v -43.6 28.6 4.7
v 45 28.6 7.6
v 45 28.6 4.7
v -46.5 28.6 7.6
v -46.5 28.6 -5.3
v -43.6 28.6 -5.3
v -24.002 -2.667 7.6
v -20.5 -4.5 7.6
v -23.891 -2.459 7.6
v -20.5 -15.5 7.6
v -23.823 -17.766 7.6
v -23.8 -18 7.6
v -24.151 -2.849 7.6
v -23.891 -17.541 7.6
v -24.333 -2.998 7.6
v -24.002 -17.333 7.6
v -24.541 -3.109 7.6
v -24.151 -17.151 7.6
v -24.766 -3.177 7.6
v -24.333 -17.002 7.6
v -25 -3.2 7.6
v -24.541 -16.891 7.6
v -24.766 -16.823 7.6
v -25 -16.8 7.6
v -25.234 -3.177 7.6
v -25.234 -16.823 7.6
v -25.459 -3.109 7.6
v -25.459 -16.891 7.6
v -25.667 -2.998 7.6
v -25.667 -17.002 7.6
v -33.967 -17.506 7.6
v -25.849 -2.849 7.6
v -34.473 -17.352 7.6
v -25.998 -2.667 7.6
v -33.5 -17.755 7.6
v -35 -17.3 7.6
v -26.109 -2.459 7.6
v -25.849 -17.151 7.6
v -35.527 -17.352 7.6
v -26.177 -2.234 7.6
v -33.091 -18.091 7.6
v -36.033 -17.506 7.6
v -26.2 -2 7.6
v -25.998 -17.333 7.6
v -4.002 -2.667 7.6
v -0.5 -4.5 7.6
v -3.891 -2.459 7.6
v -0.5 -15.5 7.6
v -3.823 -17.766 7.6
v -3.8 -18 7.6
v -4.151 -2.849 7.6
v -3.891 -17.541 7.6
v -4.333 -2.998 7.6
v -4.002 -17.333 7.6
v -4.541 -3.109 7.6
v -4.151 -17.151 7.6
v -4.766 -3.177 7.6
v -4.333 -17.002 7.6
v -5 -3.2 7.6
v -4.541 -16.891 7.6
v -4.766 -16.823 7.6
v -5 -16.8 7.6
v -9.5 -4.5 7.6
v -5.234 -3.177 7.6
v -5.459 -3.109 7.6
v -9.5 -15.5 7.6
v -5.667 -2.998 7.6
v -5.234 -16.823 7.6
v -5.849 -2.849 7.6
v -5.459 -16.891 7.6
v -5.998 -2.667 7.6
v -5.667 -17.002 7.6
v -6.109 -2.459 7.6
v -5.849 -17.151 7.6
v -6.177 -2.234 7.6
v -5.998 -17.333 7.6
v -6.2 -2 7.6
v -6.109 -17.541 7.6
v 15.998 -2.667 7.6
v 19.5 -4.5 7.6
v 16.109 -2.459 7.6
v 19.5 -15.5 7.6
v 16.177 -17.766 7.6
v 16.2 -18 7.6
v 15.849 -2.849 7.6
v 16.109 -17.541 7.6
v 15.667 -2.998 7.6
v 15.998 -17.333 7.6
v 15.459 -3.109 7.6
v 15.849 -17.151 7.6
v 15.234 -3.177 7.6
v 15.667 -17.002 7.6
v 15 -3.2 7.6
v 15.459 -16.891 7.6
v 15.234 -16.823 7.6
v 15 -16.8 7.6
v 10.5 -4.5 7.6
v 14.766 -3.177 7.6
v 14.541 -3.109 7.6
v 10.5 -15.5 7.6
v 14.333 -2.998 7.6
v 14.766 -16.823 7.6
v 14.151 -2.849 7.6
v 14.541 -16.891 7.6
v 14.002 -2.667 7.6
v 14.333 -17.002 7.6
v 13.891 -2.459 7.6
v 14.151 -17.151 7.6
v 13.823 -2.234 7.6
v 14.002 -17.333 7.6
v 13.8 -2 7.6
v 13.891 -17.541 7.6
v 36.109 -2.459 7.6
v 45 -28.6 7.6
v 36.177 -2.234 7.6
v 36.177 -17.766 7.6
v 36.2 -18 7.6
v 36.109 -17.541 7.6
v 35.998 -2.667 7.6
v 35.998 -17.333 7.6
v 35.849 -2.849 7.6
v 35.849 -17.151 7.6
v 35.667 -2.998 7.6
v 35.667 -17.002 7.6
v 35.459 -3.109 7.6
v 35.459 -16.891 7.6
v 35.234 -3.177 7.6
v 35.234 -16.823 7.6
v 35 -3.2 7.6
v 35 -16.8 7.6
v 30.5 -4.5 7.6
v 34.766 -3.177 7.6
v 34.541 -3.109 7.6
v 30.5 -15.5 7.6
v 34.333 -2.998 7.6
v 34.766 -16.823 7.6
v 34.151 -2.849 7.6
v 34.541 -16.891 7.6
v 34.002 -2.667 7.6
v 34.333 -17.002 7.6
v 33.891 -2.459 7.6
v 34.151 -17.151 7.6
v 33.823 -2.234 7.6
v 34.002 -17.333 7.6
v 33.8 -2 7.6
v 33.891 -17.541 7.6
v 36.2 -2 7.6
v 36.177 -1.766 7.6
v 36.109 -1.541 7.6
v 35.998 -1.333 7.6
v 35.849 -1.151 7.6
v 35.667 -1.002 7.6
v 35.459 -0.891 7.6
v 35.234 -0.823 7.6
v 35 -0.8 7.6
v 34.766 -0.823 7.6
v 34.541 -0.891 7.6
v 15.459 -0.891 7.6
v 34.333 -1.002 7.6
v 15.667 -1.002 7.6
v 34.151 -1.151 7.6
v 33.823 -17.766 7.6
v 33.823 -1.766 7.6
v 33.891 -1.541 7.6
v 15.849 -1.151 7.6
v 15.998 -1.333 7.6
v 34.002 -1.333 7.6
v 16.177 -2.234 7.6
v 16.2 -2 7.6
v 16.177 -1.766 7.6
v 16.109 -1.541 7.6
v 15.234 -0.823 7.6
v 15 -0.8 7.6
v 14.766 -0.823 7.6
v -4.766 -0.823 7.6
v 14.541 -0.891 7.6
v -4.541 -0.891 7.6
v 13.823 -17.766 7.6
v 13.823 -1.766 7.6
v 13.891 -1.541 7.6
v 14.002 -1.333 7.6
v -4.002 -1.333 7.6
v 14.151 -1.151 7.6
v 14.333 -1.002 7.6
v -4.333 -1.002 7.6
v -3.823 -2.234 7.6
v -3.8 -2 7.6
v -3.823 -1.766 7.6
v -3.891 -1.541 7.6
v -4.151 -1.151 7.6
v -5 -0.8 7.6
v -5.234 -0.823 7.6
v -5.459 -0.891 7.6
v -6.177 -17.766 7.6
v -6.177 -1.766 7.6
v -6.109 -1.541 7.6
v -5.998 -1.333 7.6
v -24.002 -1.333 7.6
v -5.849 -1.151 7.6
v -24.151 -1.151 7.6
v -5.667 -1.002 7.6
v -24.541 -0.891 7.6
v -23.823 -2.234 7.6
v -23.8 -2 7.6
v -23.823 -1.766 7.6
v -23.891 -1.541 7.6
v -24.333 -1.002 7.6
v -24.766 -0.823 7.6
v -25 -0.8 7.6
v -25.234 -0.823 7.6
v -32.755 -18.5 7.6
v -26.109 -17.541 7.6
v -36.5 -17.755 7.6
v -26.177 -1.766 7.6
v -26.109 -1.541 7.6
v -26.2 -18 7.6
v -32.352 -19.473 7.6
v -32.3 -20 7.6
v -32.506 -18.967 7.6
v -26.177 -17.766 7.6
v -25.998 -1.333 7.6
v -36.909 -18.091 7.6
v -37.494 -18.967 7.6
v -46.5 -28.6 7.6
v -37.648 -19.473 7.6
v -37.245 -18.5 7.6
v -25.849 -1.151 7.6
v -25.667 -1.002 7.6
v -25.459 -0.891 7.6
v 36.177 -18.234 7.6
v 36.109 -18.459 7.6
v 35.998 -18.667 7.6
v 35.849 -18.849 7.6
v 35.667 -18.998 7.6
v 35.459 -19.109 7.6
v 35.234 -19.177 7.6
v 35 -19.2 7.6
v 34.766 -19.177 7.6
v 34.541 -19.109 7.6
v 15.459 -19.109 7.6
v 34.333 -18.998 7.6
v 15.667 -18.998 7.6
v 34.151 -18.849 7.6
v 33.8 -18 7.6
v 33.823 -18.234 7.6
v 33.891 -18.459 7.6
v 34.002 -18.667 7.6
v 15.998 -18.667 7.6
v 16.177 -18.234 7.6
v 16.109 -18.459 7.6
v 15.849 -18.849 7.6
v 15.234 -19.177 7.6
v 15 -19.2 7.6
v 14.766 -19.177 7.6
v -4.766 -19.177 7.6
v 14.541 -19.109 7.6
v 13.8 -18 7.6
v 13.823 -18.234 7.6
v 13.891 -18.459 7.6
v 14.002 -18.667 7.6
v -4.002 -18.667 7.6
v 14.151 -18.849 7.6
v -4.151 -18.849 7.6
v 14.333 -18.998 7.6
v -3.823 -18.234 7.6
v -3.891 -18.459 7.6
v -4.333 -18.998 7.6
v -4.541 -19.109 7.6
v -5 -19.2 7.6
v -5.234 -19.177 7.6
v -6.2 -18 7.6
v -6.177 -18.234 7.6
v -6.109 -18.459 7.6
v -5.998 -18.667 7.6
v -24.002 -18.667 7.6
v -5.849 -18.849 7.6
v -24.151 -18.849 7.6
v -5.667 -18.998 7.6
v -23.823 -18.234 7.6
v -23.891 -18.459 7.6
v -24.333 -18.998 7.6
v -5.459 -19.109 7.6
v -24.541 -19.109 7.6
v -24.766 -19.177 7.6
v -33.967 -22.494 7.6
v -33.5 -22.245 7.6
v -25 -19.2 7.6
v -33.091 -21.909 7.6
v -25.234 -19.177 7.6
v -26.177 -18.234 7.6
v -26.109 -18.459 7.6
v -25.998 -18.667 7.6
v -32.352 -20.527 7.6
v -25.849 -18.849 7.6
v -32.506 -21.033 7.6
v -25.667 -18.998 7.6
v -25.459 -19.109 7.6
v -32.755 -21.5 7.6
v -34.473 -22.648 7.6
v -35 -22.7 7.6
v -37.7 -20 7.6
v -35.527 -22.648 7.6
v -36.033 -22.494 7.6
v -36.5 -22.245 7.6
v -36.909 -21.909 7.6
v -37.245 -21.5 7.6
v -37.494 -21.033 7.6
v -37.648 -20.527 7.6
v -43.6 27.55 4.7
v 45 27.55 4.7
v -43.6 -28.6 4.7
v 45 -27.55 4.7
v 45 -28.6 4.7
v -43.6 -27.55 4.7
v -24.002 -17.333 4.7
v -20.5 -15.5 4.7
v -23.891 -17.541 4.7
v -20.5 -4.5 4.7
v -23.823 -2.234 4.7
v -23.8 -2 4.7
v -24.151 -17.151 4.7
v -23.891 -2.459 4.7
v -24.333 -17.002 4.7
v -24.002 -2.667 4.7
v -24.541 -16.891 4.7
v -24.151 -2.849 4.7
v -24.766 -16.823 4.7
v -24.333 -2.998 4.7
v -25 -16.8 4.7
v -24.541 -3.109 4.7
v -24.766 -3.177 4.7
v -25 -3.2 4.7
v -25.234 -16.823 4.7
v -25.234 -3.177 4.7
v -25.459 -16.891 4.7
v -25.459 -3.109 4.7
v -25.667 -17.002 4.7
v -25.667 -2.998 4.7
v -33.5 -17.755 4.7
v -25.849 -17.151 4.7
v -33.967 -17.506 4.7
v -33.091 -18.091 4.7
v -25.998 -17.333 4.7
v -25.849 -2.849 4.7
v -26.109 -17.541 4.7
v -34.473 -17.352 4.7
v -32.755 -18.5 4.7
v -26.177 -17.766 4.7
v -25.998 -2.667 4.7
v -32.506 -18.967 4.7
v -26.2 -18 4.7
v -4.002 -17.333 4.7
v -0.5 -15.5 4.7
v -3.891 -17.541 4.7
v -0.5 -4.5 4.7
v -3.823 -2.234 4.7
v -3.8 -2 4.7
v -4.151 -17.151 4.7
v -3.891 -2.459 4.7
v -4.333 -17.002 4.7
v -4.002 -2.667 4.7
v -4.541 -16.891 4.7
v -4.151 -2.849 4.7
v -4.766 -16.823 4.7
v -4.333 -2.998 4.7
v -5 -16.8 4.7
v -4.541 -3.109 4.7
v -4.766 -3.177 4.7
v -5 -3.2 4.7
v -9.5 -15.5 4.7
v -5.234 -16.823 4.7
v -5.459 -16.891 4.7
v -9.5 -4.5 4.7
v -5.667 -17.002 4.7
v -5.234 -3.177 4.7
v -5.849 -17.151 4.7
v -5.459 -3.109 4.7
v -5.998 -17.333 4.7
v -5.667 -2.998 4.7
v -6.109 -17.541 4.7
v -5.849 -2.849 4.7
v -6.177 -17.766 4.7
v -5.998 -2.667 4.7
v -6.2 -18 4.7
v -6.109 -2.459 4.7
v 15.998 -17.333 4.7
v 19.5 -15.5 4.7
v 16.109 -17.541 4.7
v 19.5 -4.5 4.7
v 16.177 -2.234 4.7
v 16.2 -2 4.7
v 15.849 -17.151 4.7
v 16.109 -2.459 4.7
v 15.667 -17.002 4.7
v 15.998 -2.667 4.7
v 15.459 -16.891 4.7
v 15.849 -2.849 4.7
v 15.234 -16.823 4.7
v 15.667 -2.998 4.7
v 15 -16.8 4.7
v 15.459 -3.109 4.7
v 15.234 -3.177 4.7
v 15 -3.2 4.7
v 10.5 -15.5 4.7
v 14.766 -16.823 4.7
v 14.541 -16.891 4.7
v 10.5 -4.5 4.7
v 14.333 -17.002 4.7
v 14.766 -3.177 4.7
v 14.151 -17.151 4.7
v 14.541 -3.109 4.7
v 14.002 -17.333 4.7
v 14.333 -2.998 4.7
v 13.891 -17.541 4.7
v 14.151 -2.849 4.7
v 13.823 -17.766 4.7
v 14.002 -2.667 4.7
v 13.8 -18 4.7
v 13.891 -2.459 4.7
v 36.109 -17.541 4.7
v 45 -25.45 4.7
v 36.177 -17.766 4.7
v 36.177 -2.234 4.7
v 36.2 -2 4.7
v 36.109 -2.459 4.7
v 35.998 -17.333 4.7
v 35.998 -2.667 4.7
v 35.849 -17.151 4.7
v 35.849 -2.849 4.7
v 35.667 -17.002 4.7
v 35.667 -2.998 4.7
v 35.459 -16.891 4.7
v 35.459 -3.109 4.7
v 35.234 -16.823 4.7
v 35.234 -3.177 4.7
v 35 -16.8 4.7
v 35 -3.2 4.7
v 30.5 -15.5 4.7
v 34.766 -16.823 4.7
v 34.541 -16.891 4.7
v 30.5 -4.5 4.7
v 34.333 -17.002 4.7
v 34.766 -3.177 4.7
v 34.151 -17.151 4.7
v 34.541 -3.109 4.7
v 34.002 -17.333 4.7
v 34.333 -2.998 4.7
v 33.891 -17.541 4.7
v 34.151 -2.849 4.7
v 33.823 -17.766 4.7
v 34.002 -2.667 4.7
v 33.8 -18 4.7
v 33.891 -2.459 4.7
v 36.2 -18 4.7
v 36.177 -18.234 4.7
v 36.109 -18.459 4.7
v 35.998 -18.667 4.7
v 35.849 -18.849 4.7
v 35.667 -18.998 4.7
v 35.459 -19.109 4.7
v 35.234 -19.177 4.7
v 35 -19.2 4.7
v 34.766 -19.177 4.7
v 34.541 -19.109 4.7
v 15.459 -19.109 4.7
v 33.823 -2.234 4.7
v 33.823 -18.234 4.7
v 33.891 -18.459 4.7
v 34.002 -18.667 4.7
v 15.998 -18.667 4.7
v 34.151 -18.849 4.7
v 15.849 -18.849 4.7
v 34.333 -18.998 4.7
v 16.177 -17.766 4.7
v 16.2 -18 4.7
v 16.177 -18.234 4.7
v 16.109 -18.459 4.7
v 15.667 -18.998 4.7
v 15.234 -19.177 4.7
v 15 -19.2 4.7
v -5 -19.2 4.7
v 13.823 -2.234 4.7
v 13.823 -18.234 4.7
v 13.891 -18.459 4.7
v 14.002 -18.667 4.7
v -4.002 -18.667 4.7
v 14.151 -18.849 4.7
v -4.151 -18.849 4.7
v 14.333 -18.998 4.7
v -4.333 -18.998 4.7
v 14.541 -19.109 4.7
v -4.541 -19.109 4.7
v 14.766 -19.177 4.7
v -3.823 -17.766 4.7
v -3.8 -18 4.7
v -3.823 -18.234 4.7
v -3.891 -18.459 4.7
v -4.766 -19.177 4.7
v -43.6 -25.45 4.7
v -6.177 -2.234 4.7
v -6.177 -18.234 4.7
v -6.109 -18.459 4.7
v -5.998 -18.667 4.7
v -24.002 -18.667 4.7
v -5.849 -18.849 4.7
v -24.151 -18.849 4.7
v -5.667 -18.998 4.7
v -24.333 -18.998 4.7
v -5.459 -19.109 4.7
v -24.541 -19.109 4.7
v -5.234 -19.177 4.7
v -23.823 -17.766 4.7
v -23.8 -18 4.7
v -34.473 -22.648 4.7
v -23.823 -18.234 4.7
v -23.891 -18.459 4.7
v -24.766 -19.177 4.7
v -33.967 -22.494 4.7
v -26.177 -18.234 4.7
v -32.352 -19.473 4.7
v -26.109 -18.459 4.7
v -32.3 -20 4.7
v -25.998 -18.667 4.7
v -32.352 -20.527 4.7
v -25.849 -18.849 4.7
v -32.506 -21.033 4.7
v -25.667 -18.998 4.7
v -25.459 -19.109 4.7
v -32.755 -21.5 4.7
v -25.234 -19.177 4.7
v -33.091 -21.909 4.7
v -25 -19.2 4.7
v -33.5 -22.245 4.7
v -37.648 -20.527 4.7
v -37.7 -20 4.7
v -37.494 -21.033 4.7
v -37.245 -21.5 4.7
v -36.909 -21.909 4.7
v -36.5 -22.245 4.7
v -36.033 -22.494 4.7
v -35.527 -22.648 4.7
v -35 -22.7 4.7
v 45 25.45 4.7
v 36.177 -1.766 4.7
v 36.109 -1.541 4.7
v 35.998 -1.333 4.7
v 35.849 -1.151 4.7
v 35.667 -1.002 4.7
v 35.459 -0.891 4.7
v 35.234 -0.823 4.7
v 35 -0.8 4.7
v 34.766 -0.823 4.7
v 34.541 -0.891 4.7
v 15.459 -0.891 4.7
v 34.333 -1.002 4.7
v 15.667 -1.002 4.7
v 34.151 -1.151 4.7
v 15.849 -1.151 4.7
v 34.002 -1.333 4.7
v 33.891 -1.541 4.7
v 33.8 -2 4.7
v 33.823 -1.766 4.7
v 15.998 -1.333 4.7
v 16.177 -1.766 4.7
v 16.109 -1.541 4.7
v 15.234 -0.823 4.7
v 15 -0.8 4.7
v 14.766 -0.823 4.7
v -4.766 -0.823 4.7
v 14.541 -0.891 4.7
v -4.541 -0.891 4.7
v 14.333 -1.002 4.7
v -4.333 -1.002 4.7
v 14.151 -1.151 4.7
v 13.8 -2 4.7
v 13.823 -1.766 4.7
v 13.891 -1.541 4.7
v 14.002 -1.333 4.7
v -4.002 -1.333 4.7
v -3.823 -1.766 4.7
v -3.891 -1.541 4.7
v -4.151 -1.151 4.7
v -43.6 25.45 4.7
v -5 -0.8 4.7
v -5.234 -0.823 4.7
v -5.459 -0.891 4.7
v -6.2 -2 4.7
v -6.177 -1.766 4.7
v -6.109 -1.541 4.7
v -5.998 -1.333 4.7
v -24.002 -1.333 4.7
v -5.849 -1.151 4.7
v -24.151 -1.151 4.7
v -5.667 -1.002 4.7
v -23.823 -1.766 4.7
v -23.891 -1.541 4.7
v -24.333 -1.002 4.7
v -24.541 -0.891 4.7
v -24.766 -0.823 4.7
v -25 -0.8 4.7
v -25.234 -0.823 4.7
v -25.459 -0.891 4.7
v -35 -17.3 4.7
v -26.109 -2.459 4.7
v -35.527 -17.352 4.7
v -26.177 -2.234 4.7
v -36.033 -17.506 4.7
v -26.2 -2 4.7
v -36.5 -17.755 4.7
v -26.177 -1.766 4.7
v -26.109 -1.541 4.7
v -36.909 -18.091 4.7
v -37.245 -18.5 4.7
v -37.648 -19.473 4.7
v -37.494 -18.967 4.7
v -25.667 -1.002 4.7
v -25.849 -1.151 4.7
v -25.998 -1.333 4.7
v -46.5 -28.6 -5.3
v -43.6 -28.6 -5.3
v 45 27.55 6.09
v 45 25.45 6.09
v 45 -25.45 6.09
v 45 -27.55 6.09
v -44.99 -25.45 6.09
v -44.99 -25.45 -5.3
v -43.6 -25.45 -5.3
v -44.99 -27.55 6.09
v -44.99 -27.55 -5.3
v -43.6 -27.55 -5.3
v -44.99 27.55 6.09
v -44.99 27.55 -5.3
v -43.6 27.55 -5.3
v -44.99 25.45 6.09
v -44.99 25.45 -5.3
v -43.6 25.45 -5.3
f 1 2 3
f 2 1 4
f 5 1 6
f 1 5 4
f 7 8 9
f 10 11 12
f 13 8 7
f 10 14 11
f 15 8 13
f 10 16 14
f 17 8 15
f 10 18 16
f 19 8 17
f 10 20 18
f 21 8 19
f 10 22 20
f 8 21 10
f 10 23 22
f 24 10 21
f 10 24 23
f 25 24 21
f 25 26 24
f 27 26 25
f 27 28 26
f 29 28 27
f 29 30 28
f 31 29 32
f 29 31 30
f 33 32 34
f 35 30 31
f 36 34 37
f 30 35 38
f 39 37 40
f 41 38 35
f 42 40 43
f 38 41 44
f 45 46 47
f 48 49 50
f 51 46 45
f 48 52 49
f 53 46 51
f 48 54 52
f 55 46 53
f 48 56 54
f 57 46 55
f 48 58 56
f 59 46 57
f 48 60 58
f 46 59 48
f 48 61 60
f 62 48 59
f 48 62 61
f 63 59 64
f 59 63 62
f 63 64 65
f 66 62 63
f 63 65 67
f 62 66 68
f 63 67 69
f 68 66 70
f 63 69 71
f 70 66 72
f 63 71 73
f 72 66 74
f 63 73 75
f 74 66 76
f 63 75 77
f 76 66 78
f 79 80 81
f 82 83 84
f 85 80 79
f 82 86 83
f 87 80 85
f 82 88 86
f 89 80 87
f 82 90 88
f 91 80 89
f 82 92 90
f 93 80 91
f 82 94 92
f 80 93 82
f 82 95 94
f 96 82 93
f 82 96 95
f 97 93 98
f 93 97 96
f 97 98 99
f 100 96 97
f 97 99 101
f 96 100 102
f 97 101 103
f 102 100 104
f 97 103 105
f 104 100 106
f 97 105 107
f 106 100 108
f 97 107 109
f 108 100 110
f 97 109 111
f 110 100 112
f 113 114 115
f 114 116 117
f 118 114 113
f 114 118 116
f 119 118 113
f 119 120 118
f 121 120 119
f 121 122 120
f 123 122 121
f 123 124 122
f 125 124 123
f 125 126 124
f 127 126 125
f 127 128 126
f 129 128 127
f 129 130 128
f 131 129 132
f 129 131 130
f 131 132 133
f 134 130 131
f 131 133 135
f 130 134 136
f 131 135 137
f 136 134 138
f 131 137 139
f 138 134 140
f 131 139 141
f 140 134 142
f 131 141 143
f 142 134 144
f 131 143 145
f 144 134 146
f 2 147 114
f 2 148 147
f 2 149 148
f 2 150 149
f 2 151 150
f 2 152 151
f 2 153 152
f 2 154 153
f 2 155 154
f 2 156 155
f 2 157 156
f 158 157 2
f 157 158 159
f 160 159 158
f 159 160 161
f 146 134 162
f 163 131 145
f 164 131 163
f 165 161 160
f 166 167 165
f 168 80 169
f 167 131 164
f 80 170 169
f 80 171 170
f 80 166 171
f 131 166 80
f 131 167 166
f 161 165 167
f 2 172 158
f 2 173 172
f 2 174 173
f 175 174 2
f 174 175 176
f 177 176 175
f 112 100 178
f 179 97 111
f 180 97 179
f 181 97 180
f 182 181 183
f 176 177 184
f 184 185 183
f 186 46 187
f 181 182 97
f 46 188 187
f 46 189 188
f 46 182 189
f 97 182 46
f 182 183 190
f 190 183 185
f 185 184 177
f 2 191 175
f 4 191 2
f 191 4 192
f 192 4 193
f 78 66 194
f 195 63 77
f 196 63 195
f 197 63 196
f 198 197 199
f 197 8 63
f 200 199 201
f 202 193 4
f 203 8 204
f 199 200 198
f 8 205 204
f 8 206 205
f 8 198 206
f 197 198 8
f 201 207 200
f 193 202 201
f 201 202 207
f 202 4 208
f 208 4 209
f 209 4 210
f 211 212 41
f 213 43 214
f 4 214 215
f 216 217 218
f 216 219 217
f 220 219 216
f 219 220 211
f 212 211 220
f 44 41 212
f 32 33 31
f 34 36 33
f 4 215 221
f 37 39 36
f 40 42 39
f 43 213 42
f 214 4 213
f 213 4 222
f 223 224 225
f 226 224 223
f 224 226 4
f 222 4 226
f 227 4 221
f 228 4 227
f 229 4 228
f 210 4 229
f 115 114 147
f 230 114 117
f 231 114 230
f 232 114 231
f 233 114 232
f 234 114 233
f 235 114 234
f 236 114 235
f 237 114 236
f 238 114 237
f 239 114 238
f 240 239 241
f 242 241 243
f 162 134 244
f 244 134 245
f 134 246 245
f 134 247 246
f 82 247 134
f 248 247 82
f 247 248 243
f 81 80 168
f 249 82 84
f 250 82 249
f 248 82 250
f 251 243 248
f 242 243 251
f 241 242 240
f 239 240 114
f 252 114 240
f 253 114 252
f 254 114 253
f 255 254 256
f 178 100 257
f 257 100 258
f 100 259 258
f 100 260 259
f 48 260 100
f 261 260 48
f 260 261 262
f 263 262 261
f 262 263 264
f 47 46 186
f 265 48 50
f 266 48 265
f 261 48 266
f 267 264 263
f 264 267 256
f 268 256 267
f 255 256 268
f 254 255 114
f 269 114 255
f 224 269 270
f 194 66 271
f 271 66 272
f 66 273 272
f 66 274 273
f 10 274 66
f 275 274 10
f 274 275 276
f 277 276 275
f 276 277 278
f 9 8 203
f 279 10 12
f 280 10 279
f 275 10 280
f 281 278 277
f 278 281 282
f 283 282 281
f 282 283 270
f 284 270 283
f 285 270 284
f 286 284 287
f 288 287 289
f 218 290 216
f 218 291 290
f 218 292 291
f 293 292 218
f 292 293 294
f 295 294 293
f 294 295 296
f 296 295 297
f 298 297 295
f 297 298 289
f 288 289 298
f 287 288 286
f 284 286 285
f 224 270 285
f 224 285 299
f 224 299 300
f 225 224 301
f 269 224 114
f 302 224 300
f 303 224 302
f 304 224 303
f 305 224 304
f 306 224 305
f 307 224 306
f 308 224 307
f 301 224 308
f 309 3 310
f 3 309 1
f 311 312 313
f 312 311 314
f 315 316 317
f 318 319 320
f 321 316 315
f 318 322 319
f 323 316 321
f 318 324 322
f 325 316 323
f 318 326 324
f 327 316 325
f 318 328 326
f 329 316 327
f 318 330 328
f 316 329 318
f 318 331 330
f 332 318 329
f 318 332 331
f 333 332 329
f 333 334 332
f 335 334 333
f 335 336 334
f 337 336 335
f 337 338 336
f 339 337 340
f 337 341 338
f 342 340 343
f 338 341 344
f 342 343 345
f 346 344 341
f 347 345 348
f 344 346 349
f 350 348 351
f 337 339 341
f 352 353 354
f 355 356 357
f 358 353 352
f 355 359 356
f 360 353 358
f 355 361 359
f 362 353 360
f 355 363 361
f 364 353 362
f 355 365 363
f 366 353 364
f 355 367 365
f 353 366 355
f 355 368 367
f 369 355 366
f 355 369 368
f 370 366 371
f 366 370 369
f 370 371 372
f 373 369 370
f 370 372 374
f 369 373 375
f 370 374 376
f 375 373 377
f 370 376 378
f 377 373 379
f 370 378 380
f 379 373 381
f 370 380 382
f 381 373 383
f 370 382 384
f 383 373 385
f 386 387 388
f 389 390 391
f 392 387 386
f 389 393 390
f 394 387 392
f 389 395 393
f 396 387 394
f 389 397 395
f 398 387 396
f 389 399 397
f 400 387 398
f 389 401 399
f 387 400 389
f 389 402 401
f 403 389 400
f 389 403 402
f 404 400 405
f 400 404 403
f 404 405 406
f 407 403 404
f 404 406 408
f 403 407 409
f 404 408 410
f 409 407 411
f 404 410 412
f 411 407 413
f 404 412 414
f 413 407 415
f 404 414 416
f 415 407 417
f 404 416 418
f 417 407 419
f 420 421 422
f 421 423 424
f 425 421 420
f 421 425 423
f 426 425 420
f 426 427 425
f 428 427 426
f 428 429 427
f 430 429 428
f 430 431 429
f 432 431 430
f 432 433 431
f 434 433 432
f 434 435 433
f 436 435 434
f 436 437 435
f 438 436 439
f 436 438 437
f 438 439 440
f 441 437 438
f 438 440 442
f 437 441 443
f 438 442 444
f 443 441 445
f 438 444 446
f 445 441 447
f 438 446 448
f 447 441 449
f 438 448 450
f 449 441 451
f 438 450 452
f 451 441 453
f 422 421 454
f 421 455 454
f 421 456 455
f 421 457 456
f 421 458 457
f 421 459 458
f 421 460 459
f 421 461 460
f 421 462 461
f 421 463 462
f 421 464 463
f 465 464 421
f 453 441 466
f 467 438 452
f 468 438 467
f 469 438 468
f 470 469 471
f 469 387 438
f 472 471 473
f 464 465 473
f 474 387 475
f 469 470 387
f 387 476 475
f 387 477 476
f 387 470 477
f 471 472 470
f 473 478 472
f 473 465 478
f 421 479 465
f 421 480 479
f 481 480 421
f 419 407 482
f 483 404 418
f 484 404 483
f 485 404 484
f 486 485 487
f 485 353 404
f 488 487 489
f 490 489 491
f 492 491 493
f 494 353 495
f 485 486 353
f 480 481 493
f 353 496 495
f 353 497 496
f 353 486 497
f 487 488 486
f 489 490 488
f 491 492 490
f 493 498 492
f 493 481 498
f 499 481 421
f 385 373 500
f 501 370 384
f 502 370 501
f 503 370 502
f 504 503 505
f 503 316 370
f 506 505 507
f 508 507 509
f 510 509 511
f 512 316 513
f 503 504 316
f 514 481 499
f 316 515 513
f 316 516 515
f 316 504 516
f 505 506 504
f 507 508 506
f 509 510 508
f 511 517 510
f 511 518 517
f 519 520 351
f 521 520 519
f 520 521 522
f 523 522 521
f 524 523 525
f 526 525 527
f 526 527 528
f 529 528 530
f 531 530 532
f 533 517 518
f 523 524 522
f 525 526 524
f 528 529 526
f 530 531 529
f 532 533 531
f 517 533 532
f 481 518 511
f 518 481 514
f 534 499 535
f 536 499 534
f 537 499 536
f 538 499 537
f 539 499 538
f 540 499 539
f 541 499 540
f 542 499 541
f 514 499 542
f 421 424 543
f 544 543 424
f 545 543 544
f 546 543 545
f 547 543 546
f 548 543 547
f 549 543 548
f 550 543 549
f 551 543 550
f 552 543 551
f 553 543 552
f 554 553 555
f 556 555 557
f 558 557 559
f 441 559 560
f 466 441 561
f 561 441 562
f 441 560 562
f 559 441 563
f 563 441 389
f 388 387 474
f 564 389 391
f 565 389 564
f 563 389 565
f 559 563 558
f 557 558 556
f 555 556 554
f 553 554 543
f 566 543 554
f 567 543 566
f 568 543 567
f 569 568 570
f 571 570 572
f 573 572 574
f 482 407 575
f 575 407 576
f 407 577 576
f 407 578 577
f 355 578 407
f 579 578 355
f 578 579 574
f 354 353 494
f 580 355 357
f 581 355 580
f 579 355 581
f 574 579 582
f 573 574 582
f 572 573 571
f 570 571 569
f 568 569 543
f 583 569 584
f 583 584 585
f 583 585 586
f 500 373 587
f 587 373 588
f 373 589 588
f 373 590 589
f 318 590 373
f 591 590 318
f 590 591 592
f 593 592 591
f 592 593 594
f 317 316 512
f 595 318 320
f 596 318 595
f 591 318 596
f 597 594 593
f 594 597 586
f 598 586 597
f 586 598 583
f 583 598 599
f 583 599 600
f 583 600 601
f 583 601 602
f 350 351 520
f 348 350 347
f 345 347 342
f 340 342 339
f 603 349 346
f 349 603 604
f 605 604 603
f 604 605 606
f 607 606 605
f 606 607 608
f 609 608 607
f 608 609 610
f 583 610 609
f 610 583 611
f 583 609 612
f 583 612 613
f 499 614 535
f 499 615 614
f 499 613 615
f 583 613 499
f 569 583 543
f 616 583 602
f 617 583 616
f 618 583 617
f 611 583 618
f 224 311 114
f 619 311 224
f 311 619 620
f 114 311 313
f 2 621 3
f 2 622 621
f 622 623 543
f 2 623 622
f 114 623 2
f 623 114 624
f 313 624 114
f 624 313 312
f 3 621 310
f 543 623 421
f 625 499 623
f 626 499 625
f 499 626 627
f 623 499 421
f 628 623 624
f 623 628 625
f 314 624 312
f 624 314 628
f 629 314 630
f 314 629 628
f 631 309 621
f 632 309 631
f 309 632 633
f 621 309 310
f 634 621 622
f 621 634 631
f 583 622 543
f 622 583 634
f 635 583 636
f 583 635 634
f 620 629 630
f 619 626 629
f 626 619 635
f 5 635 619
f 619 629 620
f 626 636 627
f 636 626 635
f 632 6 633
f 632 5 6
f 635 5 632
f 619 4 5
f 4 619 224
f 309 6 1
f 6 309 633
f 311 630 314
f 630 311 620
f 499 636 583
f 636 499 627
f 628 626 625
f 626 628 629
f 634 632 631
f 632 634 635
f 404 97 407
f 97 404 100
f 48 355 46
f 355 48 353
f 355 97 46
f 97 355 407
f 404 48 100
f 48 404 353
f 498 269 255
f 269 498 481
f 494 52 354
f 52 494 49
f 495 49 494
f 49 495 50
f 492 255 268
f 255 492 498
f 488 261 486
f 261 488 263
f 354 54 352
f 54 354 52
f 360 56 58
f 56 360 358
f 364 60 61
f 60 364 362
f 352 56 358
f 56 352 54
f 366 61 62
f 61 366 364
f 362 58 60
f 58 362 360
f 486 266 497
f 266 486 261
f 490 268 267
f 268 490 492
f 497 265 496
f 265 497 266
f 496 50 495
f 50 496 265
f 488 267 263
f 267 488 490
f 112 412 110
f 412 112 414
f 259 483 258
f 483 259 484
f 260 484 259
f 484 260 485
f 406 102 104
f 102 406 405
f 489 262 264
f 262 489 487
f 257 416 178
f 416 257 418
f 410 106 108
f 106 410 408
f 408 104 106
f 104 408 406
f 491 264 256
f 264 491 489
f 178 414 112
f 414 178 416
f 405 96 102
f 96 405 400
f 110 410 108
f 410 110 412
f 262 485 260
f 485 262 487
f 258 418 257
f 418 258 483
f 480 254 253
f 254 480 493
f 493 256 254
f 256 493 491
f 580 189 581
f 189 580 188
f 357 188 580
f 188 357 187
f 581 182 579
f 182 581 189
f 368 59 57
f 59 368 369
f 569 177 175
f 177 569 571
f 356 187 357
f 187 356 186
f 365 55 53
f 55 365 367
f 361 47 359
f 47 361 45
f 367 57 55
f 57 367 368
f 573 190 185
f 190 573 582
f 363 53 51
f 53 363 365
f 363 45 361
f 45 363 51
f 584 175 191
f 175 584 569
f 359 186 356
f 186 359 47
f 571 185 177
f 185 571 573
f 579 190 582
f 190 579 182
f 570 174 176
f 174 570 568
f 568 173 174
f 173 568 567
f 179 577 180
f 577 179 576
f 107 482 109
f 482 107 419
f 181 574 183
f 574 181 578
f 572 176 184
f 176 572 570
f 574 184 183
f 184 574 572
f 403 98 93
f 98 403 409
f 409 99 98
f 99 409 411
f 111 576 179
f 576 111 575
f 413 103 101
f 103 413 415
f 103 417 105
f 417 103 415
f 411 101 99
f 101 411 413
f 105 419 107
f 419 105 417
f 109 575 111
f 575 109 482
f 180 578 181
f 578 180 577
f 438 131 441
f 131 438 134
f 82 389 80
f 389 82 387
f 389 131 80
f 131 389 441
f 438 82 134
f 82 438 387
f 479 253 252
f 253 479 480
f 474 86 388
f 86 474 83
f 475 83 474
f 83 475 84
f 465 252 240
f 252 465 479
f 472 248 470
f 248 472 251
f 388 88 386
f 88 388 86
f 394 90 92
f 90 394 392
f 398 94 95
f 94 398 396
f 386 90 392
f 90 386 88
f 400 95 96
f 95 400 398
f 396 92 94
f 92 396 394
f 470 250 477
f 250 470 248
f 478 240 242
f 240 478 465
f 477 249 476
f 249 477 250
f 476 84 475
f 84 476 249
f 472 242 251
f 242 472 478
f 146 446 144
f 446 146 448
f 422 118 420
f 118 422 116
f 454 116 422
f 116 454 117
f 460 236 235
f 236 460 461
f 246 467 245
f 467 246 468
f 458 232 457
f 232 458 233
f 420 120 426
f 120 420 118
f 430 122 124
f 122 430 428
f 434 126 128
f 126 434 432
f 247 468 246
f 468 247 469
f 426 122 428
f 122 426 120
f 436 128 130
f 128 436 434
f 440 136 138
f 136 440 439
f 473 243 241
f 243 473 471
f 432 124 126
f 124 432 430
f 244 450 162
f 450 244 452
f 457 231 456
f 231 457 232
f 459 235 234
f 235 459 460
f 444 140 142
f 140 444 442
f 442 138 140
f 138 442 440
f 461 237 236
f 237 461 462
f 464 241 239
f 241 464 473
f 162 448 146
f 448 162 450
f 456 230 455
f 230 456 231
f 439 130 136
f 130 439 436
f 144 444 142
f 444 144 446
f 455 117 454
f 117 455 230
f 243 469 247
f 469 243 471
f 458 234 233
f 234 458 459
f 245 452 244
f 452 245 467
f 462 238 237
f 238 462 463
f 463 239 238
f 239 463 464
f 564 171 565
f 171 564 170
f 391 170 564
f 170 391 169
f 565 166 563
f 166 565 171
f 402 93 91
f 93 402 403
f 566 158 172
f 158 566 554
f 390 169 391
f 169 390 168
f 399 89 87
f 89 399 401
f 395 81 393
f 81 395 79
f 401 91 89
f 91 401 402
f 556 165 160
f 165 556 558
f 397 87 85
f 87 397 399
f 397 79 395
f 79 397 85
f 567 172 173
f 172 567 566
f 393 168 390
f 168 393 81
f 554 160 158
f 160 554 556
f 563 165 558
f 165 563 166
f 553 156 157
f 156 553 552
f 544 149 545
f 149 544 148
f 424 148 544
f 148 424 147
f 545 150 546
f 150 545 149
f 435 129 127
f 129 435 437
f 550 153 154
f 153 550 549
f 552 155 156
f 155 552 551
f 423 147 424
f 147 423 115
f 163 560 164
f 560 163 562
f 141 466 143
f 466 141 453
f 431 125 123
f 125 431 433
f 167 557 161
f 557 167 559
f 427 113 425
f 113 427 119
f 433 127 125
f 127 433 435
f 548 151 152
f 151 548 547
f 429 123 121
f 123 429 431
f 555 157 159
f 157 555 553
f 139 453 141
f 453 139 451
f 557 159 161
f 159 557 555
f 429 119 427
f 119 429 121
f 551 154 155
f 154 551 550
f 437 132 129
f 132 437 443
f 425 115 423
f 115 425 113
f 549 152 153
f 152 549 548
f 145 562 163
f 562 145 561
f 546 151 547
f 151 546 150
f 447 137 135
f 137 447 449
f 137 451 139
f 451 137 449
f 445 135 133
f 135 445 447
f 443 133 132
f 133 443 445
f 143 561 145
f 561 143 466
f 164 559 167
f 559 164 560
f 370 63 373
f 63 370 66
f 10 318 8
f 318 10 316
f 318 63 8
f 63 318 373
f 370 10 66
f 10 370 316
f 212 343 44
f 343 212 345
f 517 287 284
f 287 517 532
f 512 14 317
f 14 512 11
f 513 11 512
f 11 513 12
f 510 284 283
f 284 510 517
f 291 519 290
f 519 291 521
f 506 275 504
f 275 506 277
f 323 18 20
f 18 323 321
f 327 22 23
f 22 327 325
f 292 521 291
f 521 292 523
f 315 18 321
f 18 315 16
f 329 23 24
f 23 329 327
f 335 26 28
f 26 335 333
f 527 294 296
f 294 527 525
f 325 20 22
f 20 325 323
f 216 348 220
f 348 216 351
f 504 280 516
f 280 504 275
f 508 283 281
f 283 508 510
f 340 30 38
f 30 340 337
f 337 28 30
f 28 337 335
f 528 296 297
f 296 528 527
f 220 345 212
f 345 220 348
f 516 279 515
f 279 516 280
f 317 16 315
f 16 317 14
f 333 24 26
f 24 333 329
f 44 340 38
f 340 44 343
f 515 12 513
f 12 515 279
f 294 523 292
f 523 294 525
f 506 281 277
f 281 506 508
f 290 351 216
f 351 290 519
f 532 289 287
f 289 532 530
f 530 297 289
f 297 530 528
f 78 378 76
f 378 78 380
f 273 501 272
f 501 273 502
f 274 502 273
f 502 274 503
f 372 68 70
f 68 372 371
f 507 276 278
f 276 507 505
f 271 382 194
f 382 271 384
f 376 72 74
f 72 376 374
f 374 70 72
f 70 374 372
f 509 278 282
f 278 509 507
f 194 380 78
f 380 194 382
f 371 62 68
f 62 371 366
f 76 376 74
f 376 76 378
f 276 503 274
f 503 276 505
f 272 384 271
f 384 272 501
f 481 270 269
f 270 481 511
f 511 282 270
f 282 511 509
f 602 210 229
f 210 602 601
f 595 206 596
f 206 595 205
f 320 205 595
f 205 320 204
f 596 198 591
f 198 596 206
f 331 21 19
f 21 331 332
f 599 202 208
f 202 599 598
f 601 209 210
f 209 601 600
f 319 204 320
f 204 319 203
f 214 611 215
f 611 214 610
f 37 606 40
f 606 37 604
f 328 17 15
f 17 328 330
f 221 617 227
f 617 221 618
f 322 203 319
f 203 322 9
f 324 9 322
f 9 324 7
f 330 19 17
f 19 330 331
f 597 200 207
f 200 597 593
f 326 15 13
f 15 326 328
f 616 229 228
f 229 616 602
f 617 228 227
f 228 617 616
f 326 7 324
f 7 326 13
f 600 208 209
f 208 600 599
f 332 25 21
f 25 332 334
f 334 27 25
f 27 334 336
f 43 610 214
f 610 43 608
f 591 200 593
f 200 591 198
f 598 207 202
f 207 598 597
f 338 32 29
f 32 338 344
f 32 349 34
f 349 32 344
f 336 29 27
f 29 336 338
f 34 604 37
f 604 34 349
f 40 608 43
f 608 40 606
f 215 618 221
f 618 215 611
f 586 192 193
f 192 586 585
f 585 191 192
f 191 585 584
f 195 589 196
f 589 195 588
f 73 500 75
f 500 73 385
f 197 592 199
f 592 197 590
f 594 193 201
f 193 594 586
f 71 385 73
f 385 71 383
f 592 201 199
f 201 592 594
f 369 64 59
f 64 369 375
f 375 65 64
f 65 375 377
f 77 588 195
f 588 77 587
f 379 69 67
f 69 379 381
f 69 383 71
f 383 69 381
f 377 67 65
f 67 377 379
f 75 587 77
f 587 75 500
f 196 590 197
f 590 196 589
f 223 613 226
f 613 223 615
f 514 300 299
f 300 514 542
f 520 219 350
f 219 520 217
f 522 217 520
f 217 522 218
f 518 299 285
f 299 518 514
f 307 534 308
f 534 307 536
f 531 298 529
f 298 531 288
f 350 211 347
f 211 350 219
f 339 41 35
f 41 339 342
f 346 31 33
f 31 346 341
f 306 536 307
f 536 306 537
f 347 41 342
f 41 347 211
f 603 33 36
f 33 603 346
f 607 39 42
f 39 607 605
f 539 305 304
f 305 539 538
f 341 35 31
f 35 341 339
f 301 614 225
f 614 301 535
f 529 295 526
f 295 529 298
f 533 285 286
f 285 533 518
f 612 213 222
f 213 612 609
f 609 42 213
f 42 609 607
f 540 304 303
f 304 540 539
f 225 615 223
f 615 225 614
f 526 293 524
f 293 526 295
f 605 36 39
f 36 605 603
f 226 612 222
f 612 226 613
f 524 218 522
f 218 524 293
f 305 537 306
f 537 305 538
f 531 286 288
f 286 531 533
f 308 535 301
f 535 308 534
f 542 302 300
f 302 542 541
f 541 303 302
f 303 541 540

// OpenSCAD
$fn=32;
dbu=7.8;
dpin=2;
dpindist=9.5;
dtoppin=2;
dep=11;
topdep=20;
baseth=2;
topth=0.8;
stth=1;
buth=3.4;
scrh=buth+1.1;
buw=12;
b1x=0;
b2x=20;
b3x=-20;
width=70;//70
  pd=5;
//lid 
 lidThick=2.9;
 
 doupper=true;
 dolower=false;

//makebutton(b1x);
//makebutton(b2x);
//makebutton(b3x);

//upper lane
if(doupper){

translate([0,0,1])
    difference(){
       // translate([0,0,buth+topth/2]) cube([width,topdep,topth],center=true);    
        makelid();
        translate([+5,-10,0]){
                makebuttontopout(b1x);
                makebuttontopout(b2x);       
                makebuttontopout(b3x);
                makeledcutout(b3x-20,-10);
        }
    }
}

if(dolower){
    //lower lane

    difference(){
        union(){        
             translate([0,0,-baseth/2]) cube([width,dep,baseth],center=true);    
             
        }
        makebuttoncutout(b1x);
        makebuttoncutout(b2x);
        makebuttoncutout(b3x);
    }
    translate([0,0,0]){
        makebuttonclip(b1x);
        makebuttonclip(b2x);
        makebuttonclip(b3x);
        makepole(b1x);
        makepole(b2x);
        makepole(b2x*2);
        makepole(b3x);
   }
}

   


module makebutton(tx){
    translate([45+tx,-85,0]) import ("pressed_adafruit_square_tactile_button_1010.stl",convexity=3);
}

module makebuttoncutout(tx){
    dxofs=dpindist/2-dpin/4;
    translate([tx,0,0]){
        translate([-dxofs,0,-baseth-0.1]) cylinder(r=dpin/2,h=baseth+0.2);
        translate([+dxofs,0,-baseth-0.1]) cylinder(r=dpin/2,h=baseth+0.2);
        
        //#translate([-5-2/2,0,-baseth-0.2]) cylinder(r=2/2,h=baseth+0.2);
    }
}


module makebuttonclip(tx){
    cld=1;
    clw=2;
    clh=buth+0.1;
    dxofs=buw/2+cld;
    translate([tx,0,0]){
        translate([-dxofs,0,clh/2]){
            cube([1,clw,clh],center=true);
            translate([0.4,0,clh/2+0.4]) cube([1.8,clw,0.8],center=true);
        }
        translate([+dxofs,0,clh/2]){
            cube([1,clw,clh],center=true);
            translate([-0.4,0,clh/2+0.4]) cube([1.8,clw,0.8],center=true);
        }
        //#translate([-5-2/2,0,-baseth-0.2]) cylinder(r=2/2,h=baseth+0.2);
    }
}

module makeledcutout(tx,ty){
    ledd=5.4;
    translate([tx,ty,scrh-lidThick/2+0.4]) cylinder(r=ledd/2,h=lidThick+0.4);
}

module makepole(tx){
  
    cld=1;
    clw=2;
    clh=buth+0.1;
    dxofs=buw/2+pd/2+1.5;
    dyofs=dep/2+pd/2;
    bscrh=scrh+baseth;
    translate([tx,0,0]){
        translate([-dxofs,dyofs,scrh/2-baseth/2]){
            difference(){
                cube([pd,pd,bscrh],center=true);            
                cylinder(r=1.2,h=scrh);
            }
        }
        translate([-dxofs,-dyofs,scrh/2-baseth/2]){
             difference(){
                cube([pd,pd,bscrh],center=true);            
                cylinder(r=1.2,h=scrh);
            }         
        }
        //#translate([-5-2/2,0,-baseth-0.2]) cylinder(r=2/2,h=baseth+0.2);
    }
}


module makebuttontopout(tx){
    cutw=11;
    dxofs=buw/2+pd/2+1.5;
    dyofs=dep/2+pd/2;
  
    translate([tx,0,lidThick+scrh-0.02]){
        translate([0,0,-baseth-lidThick/2-0.4]) cylinder(r=dbu/2,h=lidThick+0.4);
         translate([0,0,-baseth-0.4]) cube([cutw,cutw,lidThick+0.4],center=true);
       //screwrholes
       translate([-dxofs,-dyofs,-baseth-lidThick/2-0.4]){            
            cylinder(r=1.2,h=lidThick+0.4);      
       }  
       translate([+dxofs,-dyofs,-baseth-lidThick/2-0.4]){            
            cylinder(r=1.2,h=lidThick+0.4);      
       }  
        translate([-dxofs,dyofs,-baseth-lidThick/2-0.4]){            
            cylinder(r=1.2,h=lidThick+0.4);      
       }  
       translate([+dxofs,dyofs,-baseth-lidThick/2-0.4]){            
            cylinder(r=1.2,h=lidThick+0.4);      
       }  
    }
    
  
}


module makebuttontopoutprescie(tx){
    
    translate([tx,0,lidThick+scrh-0.02]){
        translate([0,0,-baseth-lidThick/2-0.4]) cylinder(r=dbu/2,h=lidThick+0.4);
        translate([-(4.8-dtoppin/2),4.9-dtoppin/2,-baseth-0.2]) cube([dtoppin,dtoppin,lidThick+0.1],center=true);
        translate([+(4.8-dtoppin/2),4.9-dtoppin/2,-baseth-0.2]) cube([dtoppin,dtoppin,lidThick+0.1],center=true);
        translate([-(4.8-dtoppin/2),-4.9+dtoppin/2,-baseth-0.2]) cube([dtoppin,dtoppin,lidThick+0.1],center=true);
        translate([+(4.8-dtoppin/2),-4.9+dtoppin/2,-baseth-0.2]) cube([dtoppin,dtoppin,lidThick+0.1],center=true);
    }
}

module makebuttontopoutthin(tx){
    
    translate([tx,0,buth+2.6]){
        translate([0,0,-baseth-0.7]) cylinder(r=dbu/2,h=1.1);
        translate([-(4.8-dtoppin/2),4.9-dtoppin/2,-baseth-0.2]) cube([dtoppin,dtoppin,1],center=true);
        translate([+(4.8-dtoppin/2),4.9-dtoppin/2,-baseth-0.2]) cube([dtoppin,dtoppin,1],center=true);
        translate([-(4.8-dtoppin/2),-4.9+dtoppin/2,-baseth-0.2]) cube([dtoppin,dtoppin,1],center=true);
        translate([+(4.8-dtoppin/2),-4.9+dtoppin/2,-baseth-0.2]) cube([dtoppin,dtoppin,1],center=true);
    }
}



module makelid(){    
    innerW=51;
    outerW=57.2;
    innerLen=90;
   
    innerH=10;
    grooveW=2+0.1;
    grooveX=0.1;
    grooveOfs=1.1-grooveX/2;
    grooveThick=1.3+grooveX;
    
    translate([innerLen/2,-outerW/2,scrh/2+lidThick/2]) rotate([0,0,90]){   
        difference(){
            cube([outerW,innerLen,lidThick]);   
            translate([grooveOfs,0,-0.01])cube([grooveW,innerLen,grooveThick]);
            translate([outerW-grooveOfs-grooveW,0,-0.01])cube([grooveW,innerLen,grooveThick]);
        }
        //rightflap
        translate([0,innerLen-grooveThick,-innerH]){
            difference(){
                cube([outerW,lidThick,innerH+lidThick]);
                translate([grooveOfs,-0.01,0])cube([grooveW,grooveThick,innerH+grooveThick]);
                 translate([outerW-grooveOfs-grooveW,-0.01,0])cube([grooveW,grooveThick,innerH+grooveThick]);
            }
            
        }
    }
}
